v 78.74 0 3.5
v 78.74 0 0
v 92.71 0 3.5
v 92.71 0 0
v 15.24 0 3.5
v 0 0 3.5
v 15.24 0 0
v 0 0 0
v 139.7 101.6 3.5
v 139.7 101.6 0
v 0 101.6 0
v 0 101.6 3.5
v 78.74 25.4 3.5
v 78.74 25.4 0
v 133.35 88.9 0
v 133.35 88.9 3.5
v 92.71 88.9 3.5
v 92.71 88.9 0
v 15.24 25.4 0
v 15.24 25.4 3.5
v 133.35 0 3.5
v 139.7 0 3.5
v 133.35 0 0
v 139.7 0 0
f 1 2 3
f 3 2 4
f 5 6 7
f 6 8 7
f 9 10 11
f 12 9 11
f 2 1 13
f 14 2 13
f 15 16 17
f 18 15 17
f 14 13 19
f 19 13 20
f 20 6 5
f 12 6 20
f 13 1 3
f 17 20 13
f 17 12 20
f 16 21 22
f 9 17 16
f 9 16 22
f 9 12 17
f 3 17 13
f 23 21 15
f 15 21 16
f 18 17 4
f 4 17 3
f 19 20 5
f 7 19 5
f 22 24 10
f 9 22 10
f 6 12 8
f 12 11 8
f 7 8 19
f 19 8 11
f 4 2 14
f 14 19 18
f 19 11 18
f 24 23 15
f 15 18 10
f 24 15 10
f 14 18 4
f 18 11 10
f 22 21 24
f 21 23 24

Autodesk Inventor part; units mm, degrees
ref_plane "YZ Plane" through (0, 0, 0) normal (1, 0, 0) x (0, 1, 0)
ref_plane "XZ Plane" through (0, 0, 0) normal (0, 1, 0) x (-1, 0, 0)
ref_plane "XY Plane" through (0, 0, 0) normal (0, 0, 1) x (1, 0, 0)
sketch "Sketch1" plane through (0, 0, 0) normal (0, 0, 1) x (1, 0, 0)
  line L0 (0, 0) -> (139.7, 0)
  line L1 (139.7, 0) -> (139.7, 101.6)
  line L2 (139.7, 101.6) -> (0, 101.6)
  line L3 (0, 101.6) -> (0, 0)
  dimension "d0" = 139.7
  dimension "d1" = 101.6
extrude "Extrusion1" add sketch "Sketch1" along normal blind 3.5
sketch "Sketch2" plane through (0, 0, 3.5) normal (0, 0, 1) x (1, 0, 0)
  line L0 (0, 0) -> (139.7, 0) projected
  line L1 (92.71, 0) -> (133.35, 0)
  line L2 (133.35, 0) -> (133.35, 88.9)
  line L3 (133.35, 88.9) -> (92.71, 88.9)
  line L4 (92.71, 88.9) -> (92.71, 0)
  line L5 (139.7, 0) -> (139.7, 101.6) projected
  dimension "d4" = 88.9
  dimension "d5" = 6.35
  dimension "d6" = 40.64
extrude "Extrusion2" cut sketch "Sketch2" against normal blind 3.5
sketch "Sketch3" plane through (0, 0, 3.5) normal (0, 0, 1) x (1, 0, 0)
  line L0 (15.24, 0) -> (78.74, 0)
  line L1 (78.74, 0) -> (78.74, 25.4)
  line L2 (78.74, 25.4) -> (15.24, 25.4)
  line L3 (15.24, 25.4) -> (15.24, 0)
  line L4 (133.35, 88.9) -> (133.35, 0) projected
  line L5 (133.35, 0) -> (139.7, 0) projected
  line L6 (139.7, 0) -> (139.7, 101.6) projected
  line L7 (139.7, 101.6) -> (0, 101.6) projected
  line L8 (0, 101.6) -> (0, 0) projected
  line L9 (0, 0) -> (92.71, 0) projected
  line L10 (92.71, 0) -> (92.71, 88.9) projected
  line L11 (92.71, 88.9) -> (133.35, 88.9) projected
  dimension "d9" = 25.4
  dimension "d10" = 13.97
  dimension "d11" = 63.5
  dimension "d12" = 0
extrude "Extrusion3" cut sketch "Sketch3" against normal blind 3.5 contours L3 L2 L1 L0
properties part number "CANIMDWall"
